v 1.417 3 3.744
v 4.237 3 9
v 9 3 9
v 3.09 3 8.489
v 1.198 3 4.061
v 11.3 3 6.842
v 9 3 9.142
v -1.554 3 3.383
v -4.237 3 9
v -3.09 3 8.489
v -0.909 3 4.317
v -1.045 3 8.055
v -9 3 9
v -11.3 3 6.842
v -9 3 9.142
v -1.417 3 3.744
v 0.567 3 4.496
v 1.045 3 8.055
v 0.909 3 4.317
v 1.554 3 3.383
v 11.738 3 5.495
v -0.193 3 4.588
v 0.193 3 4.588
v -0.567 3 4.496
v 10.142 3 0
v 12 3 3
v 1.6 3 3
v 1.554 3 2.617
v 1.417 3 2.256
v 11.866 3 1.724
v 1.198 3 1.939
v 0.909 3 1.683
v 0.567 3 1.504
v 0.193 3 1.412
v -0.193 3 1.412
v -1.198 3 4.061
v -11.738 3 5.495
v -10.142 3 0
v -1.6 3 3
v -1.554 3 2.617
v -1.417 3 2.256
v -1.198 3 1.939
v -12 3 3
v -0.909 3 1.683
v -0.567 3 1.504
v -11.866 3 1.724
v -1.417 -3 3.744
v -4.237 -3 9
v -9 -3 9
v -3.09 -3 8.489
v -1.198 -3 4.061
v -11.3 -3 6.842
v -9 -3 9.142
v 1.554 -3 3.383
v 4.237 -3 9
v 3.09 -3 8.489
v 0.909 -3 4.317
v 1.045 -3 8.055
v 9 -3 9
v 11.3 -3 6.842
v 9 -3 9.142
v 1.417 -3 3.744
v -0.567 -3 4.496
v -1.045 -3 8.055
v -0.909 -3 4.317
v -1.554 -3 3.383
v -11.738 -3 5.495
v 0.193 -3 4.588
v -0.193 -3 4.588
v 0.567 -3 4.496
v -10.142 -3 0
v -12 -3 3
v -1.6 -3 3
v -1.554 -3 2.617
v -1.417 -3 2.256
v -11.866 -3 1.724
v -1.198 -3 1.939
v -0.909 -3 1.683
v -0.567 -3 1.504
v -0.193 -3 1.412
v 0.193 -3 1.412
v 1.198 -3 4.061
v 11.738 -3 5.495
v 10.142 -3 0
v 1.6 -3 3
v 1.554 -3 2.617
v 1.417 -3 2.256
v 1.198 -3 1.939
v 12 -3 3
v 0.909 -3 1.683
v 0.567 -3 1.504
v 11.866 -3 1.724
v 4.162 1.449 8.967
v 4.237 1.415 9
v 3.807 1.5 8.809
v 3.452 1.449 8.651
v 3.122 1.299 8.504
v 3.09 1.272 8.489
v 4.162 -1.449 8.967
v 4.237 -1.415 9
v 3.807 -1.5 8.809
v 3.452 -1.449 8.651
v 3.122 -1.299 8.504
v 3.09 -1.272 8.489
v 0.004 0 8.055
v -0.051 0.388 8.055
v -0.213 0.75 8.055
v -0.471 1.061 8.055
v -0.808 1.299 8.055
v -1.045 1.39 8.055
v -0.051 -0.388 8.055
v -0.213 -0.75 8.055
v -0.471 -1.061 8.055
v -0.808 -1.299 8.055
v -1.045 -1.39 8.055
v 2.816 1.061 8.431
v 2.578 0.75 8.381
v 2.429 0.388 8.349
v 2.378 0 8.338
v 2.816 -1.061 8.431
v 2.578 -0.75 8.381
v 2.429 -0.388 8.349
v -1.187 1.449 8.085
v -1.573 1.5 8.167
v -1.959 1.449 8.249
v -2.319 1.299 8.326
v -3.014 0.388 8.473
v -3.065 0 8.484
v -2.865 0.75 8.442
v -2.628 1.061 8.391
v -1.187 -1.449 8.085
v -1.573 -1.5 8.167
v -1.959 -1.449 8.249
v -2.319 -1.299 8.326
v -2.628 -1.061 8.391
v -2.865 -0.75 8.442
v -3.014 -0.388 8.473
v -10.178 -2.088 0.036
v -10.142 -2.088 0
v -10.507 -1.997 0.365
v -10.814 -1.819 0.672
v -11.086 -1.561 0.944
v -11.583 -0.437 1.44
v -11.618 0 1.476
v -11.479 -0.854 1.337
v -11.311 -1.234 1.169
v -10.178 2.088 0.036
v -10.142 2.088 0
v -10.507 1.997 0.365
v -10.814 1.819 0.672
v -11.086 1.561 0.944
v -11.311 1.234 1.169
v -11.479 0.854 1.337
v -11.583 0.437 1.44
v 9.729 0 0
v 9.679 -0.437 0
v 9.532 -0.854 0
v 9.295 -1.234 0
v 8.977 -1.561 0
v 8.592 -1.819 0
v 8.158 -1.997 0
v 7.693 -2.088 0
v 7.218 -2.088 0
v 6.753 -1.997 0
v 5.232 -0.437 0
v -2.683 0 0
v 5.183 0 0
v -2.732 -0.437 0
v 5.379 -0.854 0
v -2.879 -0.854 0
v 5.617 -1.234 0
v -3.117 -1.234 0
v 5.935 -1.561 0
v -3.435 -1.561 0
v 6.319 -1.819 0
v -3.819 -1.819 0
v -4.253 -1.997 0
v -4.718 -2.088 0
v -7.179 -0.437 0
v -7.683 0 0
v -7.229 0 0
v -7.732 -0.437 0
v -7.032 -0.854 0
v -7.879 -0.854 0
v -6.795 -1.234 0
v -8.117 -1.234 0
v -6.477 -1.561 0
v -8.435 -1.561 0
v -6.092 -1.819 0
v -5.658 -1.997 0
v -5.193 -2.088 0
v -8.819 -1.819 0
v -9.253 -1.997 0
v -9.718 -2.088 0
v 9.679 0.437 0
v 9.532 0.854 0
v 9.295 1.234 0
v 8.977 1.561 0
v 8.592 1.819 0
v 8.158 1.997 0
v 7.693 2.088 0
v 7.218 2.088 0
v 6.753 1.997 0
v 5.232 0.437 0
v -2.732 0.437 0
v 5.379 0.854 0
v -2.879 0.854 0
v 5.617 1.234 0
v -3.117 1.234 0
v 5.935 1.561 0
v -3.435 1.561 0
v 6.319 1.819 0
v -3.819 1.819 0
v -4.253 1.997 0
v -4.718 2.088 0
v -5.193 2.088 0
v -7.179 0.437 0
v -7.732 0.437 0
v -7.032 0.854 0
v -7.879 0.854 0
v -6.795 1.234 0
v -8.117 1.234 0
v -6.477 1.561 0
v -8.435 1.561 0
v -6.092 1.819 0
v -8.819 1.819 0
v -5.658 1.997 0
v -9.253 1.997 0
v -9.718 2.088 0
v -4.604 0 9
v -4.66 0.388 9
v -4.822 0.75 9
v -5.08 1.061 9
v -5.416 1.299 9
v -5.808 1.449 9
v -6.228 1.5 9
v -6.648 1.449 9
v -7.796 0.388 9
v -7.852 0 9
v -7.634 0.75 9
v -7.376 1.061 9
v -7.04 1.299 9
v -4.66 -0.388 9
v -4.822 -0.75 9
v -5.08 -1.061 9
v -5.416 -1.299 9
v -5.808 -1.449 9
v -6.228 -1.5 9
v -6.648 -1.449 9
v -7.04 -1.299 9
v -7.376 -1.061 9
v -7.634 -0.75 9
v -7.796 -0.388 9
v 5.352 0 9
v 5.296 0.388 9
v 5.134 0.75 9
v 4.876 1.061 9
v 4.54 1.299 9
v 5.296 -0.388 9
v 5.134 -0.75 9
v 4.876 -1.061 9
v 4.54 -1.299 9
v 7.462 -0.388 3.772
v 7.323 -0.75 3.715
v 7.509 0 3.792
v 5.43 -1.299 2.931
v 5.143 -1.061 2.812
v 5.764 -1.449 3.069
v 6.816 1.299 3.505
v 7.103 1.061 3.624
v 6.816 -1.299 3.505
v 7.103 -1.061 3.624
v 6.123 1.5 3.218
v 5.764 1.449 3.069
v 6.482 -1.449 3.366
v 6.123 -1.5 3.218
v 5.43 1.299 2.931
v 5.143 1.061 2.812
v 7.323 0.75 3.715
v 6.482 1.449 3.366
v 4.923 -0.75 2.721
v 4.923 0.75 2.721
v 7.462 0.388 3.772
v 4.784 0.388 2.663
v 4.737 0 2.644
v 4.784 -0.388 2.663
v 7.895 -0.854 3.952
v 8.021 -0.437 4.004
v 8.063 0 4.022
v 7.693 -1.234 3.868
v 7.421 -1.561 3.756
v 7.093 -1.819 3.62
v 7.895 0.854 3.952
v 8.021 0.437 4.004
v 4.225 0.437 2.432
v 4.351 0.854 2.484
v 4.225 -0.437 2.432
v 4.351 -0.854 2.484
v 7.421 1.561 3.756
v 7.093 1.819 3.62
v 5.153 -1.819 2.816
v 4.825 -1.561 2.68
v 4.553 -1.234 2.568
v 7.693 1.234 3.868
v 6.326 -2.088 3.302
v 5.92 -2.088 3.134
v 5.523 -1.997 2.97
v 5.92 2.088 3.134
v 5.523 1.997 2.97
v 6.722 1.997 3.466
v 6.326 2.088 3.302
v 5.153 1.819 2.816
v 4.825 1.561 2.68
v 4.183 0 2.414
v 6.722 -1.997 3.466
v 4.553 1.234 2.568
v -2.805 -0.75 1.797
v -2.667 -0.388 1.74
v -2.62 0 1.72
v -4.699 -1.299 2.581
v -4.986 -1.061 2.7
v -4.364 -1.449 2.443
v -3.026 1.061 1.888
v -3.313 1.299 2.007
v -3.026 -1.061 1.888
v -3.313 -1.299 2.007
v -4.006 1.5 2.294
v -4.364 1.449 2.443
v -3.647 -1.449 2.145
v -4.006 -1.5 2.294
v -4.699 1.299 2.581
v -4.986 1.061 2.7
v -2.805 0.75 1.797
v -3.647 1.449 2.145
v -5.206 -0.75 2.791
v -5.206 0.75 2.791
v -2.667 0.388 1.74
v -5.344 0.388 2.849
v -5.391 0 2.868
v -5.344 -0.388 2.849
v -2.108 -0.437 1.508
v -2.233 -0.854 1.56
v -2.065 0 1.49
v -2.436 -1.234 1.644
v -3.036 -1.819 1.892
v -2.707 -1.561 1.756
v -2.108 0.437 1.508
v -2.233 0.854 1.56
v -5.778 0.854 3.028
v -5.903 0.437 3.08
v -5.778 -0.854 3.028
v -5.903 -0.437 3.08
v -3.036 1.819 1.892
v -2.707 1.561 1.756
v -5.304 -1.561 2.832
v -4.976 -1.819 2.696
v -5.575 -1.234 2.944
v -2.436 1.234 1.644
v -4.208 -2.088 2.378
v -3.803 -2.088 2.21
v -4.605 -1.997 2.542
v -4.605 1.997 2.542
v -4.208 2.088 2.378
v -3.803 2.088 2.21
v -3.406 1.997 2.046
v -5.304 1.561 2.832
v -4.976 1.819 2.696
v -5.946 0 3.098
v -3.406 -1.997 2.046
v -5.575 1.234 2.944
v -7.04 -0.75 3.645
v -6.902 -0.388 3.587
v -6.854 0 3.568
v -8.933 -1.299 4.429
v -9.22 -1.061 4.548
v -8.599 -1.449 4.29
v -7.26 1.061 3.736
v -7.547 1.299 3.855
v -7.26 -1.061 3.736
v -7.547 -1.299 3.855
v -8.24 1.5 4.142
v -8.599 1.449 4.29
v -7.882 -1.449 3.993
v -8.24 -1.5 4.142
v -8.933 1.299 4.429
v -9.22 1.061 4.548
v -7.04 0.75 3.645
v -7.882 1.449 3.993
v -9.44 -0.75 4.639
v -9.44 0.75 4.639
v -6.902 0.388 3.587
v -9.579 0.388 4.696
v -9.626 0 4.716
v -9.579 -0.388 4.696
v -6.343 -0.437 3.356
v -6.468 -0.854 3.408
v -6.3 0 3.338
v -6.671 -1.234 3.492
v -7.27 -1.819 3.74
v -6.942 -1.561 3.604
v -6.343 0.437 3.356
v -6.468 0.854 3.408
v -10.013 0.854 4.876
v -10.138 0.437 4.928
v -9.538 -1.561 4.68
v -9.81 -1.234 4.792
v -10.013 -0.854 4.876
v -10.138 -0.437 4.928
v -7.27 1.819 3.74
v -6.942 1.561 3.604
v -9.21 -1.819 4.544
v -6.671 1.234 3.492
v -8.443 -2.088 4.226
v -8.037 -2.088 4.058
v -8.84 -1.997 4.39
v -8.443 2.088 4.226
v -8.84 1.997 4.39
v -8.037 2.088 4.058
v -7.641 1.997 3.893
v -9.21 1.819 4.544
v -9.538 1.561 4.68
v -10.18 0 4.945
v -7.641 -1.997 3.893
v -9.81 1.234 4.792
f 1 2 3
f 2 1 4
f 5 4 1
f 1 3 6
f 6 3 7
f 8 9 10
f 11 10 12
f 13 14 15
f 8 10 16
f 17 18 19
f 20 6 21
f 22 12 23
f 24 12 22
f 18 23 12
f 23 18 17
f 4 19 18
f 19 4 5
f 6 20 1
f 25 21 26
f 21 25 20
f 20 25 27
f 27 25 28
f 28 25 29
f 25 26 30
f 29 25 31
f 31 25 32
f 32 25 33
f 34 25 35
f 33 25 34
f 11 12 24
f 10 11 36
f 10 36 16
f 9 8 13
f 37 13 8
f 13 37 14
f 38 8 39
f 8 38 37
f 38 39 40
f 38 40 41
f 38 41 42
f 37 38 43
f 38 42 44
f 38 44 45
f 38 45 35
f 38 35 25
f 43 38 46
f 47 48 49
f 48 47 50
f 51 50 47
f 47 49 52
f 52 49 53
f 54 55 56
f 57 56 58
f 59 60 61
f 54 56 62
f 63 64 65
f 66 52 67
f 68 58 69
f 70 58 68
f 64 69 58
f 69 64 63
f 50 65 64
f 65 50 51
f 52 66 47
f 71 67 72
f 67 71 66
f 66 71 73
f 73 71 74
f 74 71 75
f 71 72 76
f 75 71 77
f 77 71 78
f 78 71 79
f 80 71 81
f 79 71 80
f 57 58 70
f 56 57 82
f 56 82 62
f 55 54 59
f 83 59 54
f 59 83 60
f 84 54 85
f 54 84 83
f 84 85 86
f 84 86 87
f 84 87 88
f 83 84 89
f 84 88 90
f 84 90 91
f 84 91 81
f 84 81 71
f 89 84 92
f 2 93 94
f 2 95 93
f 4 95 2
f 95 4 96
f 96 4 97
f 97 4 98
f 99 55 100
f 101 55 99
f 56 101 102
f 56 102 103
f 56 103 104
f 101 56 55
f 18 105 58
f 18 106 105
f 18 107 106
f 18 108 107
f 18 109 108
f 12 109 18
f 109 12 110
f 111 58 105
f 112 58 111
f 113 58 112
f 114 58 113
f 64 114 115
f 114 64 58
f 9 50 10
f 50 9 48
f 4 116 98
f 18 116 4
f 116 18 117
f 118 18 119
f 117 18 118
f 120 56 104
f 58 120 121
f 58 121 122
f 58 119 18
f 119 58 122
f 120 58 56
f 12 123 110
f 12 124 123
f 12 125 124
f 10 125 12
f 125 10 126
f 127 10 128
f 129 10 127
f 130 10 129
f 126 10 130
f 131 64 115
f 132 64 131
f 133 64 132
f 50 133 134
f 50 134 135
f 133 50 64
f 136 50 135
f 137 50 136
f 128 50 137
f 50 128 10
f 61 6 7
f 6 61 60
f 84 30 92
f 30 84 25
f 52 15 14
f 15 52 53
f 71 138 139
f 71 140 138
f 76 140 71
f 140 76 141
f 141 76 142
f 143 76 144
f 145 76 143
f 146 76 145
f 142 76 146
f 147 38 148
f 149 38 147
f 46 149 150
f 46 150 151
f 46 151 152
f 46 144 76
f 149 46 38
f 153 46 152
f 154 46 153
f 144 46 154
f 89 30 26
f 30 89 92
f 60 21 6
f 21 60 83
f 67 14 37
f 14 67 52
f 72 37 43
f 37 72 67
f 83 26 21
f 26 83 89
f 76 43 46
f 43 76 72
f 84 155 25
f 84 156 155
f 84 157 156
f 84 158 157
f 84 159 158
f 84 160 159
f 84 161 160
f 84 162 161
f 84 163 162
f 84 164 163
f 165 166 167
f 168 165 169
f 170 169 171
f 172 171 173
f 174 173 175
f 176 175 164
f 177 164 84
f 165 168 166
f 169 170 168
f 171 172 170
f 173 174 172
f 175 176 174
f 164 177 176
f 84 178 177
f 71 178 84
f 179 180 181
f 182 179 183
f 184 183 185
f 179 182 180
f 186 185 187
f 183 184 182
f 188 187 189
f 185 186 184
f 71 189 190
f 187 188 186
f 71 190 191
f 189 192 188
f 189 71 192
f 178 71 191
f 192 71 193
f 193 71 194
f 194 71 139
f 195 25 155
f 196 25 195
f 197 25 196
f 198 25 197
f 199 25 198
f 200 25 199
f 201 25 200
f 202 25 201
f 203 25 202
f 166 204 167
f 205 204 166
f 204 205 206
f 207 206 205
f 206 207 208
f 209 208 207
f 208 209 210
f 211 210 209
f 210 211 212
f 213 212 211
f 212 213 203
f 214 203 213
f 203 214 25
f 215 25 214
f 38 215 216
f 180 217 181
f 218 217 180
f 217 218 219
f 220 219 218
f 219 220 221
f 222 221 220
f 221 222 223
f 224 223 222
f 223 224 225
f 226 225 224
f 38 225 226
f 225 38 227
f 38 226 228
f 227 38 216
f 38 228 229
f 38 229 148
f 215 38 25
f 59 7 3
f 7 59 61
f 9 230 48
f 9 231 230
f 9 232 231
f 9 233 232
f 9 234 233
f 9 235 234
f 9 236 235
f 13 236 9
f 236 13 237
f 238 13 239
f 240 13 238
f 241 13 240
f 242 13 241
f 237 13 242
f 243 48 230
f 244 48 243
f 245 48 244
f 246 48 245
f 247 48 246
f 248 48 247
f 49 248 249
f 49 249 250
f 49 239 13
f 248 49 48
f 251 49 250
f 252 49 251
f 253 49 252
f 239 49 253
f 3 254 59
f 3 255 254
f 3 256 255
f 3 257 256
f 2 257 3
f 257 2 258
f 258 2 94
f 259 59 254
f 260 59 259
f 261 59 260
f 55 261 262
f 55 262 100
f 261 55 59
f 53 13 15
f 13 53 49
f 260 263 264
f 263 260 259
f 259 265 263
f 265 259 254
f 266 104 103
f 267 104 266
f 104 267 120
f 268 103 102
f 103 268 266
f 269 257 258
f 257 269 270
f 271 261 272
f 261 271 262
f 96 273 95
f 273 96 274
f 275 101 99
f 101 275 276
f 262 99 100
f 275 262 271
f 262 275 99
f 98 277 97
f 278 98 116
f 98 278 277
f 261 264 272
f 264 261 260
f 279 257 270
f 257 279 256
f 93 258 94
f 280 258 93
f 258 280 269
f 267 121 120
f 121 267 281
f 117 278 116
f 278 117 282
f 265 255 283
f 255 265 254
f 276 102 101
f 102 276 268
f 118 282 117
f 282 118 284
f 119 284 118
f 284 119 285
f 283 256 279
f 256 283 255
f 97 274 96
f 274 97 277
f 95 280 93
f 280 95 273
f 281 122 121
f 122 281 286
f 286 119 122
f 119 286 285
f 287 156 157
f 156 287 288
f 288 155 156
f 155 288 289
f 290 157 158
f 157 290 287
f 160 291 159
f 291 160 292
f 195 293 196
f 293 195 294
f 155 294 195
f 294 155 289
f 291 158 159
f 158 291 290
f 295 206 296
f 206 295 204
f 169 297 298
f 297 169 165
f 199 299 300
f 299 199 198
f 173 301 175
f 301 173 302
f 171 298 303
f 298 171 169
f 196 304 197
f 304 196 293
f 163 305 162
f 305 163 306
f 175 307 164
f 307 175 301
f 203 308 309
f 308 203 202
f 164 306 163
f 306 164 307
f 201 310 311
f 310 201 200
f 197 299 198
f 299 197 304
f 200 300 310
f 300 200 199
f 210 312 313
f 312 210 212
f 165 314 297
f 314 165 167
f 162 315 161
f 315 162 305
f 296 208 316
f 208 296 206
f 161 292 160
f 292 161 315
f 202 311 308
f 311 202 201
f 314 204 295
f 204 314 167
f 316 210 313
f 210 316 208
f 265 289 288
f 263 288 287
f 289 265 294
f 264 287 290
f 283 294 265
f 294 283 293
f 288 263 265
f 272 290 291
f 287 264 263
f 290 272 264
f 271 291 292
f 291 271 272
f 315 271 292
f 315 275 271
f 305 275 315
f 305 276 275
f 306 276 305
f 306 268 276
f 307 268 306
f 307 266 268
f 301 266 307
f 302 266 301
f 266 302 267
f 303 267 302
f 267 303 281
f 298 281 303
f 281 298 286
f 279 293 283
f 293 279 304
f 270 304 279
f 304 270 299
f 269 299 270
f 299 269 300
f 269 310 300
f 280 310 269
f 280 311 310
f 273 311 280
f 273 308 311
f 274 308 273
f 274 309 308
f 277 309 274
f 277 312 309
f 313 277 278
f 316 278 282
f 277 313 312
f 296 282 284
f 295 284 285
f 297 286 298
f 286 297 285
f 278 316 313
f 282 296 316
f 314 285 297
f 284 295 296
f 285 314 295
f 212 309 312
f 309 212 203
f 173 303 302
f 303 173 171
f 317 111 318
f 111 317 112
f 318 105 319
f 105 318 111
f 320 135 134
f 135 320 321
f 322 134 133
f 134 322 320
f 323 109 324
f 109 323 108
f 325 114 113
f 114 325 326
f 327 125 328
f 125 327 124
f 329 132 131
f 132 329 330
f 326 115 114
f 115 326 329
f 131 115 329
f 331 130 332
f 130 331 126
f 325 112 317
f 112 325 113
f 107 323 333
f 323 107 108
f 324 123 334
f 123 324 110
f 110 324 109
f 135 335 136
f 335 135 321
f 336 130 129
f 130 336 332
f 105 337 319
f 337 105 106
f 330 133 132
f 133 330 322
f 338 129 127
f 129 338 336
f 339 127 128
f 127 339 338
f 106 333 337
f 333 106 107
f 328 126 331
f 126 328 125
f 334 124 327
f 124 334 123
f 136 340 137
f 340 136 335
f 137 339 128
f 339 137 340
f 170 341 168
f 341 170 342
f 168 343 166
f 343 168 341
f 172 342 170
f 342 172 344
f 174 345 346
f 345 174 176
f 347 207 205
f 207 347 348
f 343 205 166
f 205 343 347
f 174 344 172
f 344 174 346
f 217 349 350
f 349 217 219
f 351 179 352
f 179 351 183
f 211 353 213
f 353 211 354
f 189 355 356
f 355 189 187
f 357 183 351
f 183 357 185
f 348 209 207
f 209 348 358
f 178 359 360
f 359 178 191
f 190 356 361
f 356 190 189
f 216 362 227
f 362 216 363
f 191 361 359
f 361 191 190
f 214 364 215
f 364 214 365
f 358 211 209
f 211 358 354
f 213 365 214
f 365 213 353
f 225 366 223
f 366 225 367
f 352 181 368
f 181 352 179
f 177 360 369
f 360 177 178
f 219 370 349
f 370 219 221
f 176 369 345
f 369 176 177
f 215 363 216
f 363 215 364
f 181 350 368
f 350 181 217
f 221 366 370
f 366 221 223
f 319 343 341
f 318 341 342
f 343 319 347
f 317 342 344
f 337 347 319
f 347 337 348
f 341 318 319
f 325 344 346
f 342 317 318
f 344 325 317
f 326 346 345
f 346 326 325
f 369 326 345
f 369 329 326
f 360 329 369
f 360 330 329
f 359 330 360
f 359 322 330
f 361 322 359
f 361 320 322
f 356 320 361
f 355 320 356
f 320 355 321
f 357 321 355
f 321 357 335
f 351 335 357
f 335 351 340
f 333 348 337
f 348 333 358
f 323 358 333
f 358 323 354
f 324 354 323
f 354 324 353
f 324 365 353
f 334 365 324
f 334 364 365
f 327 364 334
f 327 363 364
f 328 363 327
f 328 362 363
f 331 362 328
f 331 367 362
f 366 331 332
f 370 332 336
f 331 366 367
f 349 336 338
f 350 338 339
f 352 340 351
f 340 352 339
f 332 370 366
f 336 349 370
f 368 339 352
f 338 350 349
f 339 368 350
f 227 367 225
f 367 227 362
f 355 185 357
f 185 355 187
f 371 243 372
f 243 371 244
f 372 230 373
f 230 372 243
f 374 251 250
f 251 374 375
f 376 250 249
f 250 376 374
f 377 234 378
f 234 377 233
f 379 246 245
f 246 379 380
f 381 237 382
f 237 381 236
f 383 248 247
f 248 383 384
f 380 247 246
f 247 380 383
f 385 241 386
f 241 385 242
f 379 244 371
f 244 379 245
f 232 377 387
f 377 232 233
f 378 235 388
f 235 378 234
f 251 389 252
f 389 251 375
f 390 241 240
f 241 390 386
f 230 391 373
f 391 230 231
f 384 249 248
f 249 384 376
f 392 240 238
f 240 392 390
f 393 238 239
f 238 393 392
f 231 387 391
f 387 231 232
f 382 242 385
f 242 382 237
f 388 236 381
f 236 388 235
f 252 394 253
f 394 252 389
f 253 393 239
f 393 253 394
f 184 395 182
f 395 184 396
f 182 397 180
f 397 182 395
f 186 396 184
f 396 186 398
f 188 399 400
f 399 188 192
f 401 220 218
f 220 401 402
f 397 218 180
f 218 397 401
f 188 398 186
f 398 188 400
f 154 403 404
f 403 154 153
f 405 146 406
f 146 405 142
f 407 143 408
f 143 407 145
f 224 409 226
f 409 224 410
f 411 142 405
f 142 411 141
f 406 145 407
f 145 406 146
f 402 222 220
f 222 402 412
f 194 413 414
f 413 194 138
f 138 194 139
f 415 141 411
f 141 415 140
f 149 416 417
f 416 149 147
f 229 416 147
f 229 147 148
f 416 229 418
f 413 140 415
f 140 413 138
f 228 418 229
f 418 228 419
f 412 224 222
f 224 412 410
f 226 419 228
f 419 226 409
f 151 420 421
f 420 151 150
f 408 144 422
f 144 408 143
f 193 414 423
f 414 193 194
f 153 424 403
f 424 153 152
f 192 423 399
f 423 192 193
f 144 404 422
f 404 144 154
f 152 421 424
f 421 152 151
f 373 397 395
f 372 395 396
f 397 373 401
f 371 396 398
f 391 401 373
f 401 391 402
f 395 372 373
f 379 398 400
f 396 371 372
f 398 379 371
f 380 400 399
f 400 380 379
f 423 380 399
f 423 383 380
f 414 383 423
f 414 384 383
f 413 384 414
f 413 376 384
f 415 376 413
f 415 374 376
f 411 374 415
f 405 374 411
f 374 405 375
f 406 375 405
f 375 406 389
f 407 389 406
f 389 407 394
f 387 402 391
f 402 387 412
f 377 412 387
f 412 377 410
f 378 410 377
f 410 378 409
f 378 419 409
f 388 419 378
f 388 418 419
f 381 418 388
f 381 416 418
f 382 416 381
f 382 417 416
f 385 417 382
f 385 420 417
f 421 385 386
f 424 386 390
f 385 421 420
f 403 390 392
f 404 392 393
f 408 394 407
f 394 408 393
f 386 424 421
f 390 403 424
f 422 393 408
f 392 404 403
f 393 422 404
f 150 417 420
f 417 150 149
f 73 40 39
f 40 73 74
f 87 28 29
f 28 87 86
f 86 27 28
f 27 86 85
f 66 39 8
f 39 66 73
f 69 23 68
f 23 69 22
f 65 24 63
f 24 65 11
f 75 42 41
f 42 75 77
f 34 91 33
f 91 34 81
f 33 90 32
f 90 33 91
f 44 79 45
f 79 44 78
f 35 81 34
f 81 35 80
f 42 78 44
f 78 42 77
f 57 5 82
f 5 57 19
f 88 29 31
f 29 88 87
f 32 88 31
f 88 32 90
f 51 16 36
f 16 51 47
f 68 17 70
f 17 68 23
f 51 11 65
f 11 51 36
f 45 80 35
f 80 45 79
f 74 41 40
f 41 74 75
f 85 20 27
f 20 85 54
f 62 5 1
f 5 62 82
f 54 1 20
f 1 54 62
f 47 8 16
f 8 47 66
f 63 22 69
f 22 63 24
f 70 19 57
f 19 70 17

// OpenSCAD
module ring(r1,r2,h1) {
    difference() {
        cylinder(r=r1, h=h1, center=true, $fs=0.4);
        cylinder(r=r2, h=h1*1.01, center=true, $fs=0.4);
    }
}

module beams() {
difference() {
    
    union() {
        rotate([0,22.5,0]) translate([0,0,-3]) {
            cylinder(d=3, h=50, $fs=0.4);
            translate([0,0,19]) cylinder(d=4.2, h=10, $fs=0.4);
        }
        translate([2.5,0,0]) rotate([0,-22.5,0]) translate([0,0,-3]){ 
            cylinder(d=3, h=50, $fs=0.4);
            translate([0,0,20]) cylinder(d=4.2, h=10, $fs=0.4);
        }
        translate([-2.5,0,0]) rotate([0,-22.5,0]) translate([0,0,-3]){ 
            cylinder(d=3, h=50, $fs=0.4);
            translate([0,0,18]) cylinder(d=4.2, h=10, $fs=0.4);
        }
    }
    
    translate([0,0,-6]) cube(12,center=true);
}
}

module block() {
    difference() {
      intersection() {
        rotate([90,0,0])ring(r1=33,r2=10,h1=6);
        translate([0,0,14])rotate([0,45,0])cube(20, center=true);
      }
      translate([-30,-15,18])cube([60,20,40]);
      translate([0,0,15])rotate([90,0,0])ring(20,12,8);
      cube(18,center=true);
    }
}

module holder() {
    difference() {
        block();
        beams();
        translate([0,0,15])rotate([90,0,0])cylinder(d=3.2, h=10,center=true, $fs=0.4);
    }
 }

// translate to print base
translate([0,0,18])rotate([180,0,0]) holder();
